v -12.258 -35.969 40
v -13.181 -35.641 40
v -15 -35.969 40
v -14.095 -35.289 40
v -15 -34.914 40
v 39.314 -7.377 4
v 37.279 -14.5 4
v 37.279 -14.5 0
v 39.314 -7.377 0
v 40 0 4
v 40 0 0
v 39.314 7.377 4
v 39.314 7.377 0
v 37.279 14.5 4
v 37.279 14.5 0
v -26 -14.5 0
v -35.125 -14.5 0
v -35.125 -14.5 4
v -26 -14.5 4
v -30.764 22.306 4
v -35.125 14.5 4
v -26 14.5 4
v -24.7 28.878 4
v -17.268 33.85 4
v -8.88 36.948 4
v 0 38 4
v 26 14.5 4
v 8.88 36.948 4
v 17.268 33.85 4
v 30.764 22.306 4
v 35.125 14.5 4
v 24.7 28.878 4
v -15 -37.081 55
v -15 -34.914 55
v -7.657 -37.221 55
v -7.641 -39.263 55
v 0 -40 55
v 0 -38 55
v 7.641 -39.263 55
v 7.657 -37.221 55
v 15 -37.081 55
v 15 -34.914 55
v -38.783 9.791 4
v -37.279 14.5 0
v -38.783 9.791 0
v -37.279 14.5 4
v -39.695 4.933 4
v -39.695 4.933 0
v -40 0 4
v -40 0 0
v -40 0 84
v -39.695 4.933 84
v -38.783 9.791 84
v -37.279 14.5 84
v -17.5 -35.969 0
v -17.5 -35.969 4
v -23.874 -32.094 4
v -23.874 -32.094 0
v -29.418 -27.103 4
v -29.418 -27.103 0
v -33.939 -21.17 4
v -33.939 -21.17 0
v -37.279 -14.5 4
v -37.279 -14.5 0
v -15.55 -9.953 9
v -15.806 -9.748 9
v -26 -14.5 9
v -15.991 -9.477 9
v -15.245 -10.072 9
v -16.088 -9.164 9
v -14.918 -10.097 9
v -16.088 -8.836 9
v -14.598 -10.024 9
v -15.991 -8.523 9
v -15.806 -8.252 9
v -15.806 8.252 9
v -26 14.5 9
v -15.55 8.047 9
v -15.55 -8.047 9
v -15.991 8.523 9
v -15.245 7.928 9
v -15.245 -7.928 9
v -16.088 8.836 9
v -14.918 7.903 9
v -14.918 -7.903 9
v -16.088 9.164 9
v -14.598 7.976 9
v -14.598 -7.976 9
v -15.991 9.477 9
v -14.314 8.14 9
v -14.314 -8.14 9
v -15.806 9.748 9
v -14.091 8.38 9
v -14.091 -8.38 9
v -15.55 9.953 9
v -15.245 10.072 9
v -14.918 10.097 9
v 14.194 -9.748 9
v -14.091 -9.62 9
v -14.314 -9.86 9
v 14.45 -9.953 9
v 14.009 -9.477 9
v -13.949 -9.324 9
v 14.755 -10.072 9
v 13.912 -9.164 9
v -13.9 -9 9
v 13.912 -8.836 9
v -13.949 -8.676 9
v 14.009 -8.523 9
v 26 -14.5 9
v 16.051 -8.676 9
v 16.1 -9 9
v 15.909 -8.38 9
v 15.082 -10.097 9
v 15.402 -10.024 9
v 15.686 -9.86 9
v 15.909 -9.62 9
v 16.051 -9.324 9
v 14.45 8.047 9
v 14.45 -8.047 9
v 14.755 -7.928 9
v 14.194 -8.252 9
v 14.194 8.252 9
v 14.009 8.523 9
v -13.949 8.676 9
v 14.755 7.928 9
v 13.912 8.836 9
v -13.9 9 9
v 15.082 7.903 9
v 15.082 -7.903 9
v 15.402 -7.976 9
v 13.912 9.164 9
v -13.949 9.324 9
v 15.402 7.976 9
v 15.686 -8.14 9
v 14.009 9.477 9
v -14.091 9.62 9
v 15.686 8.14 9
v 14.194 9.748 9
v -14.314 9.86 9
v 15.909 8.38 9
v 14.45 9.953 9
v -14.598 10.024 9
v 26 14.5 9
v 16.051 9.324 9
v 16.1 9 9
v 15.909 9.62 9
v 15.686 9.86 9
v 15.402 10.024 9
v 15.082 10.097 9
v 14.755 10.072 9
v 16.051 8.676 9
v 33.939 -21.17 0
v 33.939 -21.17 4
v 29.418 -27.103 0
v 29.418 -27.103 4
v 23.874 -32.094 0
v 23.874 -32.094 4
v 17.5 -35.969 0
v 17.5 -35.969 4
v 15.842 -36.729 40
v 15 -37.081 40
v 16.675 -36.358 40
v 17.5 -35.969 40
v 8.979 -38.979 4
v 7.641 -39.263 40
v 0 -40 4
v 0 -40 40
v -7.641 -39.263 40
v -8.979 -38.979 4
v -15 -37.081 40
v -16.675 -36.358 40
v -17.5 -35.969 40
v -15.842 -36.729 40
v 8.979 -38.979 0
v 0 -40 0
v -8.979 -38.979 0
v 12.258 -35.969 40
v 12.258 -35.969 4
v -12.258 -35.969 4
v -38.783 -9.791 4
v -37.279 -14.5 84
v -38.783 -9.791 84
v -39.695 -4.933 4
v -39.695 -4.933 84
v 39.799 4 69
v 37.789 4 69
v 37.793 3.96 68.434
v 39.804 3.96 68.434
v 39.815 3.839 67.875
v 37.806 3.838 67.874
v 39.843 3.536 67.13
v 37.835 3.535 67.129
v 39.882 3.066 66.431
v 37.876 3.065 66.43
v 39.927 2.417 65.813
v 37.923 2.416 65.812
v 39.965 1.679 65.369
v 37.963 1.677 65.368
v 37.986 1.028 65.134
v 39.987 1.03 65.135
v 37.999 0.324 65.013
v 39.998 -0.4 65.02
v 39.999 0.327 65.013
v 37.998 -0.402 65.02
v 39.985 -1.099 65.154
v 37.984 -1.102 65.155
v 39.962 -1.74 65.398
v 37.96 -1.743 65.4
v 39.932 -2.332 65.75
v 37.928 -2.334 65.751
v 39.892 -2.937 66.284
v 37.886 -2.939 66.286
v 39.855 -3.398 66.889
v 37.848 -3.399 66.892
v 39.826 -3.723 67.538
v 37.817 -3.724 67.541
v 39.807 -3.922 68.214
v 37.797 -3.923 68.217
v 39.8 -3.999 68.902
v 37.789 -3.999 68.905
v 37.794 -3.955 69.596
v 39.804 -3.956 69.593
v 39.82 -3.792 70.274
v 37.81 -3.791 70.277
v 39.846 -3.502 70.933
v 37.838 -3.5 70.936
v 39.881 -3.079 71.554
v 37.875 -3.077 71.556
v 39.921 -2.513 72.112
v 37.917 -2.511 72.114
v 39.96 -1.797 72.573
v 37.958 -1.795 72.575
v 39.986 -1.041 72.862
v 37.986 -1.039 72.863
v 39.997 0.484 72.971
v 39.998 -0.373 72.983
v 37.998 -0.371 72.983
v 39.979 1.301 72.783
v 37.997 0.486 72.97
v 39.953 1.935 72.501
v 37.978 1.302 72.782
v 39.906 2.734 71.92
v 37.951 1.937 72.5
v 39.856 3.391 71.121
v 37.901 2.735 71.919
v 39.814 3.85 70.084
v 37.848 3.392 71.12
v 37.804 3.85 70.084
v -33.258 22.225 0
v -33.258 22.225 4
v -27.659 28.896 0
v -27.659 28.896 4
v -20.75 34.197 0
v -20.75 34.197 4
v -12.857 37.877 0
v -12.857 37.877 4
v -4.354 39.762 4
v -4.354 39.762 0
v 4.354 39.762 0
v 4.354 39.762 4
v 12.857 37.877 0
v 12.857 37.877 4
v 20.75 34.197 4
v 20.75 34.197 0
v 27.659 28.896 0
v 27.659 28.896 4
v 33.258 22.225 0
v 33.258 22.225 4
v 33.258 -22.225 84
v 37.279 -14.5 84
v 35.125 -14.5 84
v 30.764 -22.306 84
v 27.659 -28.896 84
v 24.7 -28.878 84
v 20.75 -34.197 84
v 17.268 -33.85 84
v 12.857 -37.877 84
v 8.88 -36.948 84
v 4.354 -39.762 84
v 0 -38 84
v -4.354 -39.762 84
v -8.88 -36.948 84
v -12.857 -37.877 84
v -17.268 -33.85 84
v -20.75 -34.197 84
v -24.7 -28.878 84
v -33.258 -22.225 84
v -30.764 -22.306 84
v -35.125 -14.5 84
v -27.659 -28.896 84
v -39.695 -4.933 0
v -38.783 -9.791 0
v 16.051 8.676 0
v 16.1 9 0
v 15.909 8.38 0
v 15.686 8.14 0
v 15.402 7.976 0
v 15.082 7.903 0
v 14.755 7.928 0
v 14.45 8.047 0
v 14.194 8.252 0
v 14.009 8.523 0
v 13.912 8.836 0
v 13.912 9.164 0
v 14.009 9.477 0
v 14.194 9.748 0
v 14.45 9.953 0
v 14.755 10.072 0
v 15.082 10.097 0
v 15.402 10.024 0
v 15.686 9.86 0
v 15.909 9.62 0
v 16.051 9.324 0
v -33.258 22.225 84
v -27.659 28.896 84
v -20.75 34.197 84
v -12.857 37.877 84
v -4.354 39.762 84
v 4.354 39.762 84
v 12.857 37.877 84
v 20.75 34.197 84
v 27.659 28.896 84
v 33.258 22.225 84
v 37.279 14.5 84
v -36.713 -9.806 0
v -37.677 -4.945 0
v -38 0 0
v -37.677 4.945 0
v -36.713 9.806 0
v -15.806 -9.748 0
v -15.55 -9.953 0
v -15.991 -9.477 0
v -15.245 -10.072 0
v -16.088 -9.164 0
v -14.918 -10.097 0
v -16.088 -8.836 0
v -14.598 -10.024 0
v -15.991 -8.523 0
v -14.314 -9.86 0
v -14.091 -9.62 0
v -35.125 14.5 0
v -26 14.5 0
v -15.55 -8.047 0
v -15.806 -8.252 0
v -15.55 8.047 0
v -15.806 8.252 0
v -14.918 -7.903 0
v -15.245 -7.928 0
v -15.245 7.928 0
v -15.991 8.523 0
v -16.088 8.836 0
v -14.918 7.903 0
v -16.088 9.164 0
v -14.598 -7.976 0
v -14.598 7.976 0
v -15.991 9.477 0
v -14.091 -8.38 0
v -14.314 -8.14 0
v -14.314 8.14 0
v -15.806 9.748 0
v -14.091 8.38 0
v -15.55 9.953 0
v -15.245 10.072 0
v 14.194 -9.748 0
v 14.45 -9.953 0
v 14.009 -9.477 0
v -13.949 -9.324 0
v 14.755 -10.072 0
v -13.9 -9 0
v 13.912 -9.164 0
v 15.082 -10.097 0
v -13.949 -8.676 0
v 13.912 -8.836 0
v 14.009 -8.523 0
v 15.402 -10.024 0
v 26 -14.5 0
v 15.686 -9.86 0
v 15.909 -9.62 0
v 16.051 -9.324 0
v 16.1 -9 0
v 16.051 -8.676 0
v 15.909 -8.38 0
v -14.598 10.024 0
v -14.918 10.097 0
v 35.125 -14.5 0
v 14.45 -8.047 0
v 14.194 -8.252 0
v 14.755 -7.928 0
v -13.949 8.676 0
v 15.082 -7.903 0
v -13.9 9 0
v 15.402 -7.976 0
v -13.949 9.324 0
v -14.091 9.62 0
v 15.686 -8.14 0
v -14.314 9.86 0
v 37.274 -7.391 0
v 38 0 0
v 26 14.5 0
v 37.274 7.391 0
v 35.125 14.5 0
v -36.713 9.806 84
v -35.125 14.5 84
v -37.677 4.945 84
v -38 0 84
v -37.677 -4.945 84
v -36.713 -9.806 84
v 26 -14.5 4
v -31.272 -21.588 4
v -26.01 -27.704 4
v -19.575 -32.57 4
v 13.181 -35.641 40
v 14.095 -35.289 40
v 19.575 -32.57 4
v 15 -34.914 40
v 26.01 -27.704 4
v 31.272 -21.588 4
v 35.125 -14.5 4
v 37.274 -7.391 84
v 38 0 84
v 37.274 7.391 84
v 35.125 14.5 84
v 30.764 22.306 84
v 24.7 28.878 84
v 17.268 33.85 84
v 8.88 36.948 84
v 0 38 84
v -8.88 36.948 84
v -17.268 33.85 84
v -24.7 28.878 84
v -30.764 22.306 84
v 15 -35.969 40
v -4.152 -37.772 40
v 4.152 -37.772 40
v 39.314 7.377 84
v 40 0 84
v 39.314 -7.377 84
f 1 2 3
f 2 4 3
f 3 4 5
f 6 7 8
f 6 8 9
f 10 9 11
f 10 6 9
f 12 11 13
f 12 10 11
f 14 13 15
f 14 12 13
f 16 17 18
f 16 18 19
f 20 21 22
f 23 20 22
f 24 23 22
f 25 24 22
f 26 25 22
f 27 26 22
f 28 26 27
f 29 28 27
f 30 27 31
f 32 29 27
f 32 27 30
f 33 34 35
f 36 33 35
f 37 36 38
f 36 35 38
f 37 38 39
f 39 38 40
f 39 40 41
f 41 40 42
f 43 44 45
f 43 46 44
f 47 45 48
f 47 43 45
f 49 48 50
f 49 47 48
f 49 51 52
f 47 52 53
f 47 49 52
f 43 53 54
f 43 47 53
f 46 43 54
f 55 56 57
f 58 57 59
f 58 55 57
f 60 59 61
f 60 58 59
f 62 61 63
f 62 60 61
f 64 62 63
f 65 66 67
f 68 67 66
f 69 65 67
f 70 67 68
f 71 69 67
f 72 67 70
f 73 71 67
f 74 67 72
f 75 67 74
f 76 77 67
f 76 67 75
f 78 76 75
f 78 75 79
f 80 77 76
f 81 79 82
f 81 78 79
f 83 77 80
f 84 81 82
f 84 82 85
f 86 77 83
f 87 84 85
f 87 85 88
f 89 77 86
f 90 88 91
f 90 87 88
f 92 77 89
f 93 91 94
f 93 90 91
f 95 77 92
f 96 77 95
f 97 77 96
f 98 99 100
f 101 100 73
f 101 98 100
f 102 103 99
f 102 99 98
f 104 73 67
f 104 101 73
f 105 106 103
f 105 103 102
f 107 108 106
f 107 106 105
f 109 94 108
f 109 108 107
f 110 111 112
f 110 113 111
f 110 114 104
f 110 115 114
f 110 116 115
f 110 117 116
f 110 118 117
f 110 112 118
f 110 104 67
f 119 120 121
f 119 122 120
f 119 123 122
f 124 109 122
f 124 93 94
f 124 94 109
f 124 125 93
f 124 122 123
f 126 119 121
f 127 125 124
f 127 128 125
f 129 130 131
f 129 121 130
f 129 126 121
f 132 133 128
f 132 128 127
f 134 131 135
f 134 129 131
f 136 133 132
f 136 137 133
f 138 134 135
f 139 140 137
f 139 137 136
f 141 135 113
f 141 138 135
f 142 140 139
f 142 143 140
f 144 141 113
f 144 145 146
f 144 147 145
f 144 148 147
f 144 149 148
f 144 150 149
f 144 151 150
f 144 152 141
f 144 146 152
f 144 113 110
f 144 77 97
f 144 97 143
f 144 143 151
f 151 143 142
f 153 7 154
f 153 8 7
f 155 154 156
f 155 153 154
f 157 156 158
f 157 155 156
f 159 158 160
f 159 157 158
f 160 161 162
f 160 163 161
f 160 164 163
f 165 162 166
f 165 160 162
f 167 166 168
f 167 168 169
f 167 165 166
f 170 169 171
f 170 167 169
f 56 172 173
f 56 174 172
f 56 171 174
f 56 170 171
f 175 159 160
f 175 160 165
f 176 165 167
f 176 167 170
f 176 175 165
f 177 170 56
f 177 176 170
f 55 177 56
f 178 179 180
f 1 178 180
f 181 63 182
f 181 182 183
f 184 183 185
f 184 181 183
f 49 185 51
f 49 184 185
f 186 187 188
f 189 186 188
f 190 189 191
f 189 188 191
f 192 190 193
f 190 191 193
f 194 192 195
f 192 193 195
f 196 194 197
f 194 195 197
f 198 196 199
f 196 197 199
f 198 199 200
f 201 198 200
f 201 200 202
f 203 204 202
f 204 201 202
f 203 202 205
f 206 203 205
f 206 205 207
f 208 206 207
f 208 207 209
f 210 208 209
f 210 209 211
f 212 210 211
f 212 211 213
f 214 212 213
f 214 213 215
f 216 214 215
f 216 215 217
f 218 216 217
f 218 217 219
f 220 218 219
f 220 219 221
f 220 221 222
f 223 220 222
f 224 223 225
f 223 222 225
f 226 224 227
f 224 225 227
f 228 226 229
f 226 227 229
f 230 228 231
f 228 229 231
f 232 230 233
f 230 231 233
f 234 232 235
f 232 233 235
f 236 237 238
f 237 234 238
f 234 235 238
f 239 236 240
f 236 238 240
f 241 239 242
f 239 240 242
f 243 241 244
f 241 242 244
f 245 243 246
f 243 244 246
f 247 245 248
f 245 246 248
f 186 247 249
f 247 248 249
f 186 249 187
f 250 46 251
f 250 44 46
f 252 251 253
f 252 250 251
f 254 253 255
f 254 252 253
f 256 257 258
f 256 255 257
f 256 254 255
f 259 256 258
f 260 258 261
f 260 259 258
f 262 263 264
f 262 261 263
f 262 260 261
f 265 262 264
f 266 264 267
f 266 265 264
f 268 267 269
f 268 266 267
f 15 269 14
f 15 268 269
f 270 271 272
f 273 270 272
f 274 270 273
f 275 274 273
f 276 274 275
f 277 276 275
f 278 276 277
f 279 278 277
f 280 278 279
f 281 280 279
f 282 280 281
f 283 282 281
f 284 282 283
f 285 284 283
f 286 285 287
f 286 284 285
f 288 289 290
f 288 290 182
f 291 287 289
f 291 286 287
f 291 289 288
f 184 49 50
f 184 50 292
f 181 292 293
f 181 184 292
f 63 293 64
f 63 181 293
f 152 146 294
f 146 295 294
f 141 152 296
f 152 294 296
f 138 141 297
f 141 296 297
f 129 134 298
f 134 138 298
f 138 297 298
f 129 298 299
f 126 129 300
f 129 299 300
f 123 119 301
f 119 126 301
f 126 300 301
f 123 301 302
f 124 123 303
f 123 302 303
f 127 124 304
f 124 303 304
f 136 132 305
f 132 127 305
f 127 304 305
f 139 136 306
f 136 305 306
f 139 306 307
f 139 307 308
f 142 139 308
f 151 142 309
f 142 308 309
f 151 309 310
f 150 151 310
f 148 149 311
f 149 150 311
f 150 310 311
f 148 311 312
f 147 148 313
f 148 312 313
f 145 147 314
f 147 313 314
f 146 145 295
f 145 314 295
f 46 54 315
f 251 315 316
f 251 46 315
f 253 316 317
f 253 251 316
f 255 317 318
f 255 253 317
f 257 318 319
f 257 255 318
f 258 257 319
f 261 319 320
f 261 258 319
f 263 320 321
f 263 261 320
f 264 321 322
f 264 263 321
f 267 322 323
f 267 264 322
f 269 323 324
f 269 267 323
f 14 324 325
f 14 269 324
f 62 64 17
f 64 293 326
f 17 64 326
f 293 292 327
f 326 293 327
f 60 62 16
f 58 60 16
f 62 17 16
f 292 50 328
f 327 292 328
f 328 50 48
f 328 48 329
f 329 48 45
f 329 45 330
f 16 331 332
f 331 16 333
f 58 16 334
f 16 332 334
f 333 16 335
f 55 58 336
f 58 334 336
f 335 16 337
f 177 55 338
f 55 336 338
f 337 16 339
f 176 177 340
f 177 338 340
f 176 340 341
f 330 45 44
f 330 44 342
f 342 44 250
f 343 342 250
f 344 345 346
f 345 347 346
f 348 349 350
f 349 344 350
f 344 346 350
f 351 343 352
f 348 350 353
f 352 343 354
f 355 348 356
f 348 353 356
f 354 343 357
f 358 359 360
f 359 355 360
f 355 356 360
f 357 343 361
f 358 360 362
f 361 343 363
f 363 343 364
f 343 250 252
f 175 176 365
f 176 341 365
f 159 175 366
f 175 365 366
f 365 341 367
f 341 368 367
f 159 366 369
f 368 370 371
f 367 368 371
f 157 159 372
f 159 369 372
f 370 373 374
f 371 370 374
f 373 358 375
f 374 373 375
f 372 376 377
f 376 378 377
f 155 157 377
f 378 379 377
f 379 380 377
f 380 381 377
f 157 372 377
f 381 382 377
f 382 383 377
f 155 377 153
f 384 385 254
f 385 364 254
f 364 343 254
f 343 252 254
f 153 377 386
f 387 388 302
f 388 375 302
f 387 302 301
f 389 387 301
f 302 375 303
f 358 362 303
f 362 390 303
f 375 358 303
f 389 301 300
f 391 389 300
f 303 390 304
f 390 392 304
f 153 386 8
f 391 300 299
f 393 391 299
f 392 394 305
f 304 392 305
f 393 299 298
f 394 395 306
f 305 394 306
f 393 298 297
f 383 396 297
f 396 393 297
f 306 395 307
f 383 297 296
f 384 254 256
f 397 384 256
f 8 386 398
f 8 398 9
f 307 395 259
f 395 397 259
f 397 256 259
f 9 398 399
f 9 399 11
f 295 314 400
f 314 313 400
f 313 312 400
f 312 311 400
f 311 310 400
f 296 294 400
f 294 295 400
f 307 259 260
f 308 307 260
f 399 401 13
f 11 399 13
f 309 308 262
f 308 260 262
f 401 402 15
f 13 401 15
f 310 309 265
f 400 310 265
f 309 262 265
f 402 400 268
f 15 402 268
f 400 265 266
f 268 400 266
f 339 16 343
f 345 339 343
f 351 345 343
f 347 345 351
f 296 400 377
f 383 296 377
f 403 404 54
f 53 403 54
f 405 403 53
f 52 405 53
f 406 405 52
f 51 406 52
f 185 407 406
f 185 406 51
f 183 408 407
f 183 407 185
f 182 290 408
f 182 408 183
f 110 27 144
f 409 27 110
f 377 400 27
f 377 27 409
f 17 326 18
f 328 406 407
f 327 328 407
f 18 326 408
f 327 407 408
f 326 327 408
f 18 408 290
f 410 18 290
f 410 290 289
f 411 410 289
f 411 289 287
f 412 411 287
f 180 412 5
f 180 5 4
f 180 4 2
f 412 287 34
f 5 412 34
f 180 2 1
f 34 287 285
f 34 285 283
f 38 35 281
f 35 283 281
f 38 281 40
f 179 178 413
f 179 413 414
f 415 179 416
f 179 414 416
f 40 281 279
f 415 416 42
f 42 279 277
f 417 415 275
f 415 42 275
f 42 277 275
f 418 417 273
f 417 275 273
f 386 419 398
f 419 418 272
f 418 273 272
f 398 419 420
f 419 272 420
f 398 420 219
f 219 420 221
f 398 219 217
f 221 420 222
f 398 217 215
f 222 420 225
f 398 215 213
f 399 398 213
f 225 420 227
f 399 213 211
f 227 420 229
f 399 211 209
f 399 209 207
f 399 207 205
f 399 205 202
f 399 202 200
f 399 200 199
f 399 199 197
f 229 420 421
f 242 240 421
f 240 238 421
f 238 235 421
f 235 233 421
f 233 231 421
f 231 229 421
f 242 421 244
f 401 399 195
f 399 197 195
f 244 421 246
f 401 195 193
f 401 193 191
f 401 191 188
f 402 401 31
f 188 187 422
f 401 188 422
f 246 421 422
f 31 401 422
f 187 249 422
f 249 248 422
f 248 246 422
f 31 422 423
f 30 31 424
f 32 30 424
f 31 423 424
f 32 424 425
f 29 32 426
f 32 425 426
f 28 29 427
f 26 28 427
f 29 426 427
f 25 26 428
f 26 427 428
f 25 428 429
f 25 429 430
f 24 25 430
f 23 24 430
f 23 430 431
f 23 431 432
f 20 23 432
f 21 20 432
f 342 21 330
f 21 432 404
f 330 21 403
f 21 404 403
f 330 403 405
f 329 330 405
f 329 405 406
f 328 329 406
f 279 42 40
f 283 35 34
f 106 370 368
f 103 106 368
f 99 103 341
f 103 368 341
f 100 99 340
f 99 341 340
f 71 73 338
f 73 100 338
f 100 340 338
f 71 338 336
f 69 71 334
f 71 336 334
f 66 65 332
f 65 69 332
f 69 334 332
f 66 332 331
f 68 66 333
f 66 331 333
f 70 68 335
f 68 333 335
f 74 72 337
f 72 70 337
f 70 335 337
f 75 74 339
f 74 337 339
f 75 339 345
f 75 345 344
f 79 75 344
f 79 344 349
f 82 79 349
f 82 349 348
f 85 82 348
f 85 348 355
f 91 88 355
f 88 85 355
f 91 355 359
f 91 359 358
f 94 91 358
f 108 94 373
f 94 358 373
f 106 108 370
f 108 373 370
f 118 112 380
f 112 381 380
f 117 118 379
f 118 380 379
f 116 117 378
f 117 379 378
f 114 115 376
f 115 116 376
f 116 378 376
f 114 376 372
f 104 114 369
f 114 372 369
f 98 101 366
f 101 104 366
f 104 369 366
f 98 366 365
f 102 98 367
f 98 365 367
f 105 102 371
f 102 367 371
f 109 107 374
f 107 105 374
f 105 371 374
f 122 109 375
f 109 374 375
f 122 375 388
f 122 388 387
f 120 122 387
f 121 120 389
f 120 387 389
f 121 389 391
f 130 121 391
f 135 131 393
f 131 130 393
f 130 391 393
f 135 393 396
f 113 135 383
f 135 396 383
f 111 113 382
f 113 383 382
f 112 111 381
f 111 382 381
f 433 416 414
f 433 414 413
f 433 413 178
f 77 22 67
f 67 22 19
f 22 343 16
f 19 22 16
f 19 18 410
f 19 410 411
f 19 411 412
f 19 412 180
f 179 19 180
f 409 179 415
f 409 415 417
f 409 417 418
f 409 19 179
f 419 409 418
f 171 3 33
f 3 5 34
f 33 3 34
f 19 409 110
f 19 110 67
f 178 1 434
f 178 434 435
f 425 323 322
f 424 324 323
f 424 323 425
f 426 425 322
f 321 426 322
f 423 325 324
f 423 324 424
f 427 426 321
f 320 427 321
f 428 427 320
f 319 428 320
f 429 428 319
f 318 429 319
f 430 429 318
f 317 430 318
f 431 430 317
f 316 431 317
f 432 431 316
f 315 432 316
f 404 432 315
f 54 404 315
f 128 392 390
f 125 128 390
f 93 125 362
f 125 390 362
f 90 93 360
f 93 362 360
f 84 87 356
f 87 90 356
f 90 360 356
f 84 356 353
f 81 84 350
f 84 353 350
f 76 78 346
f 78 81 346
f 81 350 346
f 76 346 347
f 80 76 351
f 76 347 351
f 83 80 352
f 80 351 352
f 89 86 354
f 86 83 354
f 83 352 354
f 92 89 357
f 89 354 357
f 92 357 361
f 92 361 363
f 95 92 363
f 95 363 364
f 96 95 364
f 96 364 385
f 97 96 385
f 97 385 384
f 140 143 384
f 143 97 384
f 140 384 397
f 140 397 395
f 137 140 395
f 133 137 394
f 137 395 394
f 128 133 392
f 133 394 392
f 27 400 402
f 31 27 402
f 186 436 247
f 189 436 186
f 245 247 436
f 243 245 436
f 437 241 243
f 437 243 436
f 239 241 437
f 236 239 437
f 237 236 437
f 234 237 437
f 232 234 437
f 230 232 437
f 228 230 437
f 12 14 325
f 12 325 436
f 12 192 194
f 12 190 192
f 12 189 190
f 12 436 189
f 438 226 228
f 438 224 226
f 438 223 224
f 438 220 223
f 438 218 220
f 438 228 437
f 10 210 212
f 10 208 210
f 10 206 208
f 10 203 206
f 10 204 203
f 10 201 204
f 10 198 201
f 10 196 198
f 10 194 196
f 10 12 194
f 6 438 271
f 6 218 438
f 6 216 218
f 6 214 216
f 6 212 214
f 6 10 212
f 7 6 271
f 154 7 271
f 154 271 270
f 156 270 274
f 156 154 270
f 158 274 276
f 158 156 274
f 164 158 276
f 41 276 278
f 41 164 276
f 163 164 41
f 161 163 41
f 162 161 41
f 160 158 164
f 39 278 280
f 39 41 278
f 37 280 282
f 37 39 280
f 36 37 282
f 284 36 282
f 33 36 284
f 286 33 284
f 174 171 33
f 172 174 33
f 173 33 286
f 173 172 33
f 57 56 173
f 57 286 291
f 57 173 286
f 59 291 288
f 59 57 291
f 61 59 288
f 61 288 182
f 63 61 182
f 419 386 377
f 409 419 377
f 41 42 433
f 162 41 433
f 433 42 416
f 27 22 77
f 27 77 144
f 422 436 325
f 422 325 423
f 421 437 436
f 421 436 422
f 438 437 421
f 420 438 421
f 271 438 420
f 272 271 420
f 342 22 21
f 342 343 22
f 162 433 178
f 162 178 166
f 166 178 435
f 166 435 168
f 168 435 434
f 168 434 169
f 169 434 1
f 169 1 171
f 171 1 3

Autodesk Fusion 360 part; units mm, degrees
sketch "Sketch1" plane through (0, 0, 0) normal (0, 0, 1) x (1, 0, 0)
  circle A0 centre (0, 0) radius 40
  line L0 (0, 40) -> (0, -40) construction
  circle A1 centre (0, 0) radius 43
  line L1 (-26, 14.5) -> (-26, -14.5)
  line L2 (-40.4815, -14.5) -> (-26, -14.5)
  line L3 (-26, 14.5) -> (-40.4815, 14.5)
  line L4 (40, 0) -> (-40, 0) construction
  line L5 (26, 14.5) -> (40.4815, 14.5)
  line L6 (26, 14.5) -> (26, -14.5)
  line L7 (40.4815, -14.5) -> (26, -14.5)
  circle A2 centre (15, -9) radius 1.1
  circle A3 centre (15, 9) radius 1.1
  circle A4 centre (-15, -9) radius 1.1
  circle A5 centre (-15, 9) radius 1.1
  line L8 (-26, 14.5) -> (26, 14.5)
  line L9 (26, -14.5) -> (-26, -14.5)
  line L10 (17.5, -35.9687) -> (-17.5, -35.9687)
  dimension "d1" = 80
  dimension "d39" = 3
  dimension "d40" = 29
  dimension "d41" = 14
  dimension "d49" = 2.2
  dimension "d50" = 9
  dimension "d51" = 15
  dimension "d52" = 11
  dimension "d69" = 35
extrude "Extrude1" add sketch "Sketch1" along normal blind 4 contours A0 L10 | A0 L2 L7 L9 L10 | A0 L3 L5 L8 | L1 L6 L8 L9
sketch "Sketch3" plane through (0, 0, 4) normal (0, 0, 1) x (-1, 0, 0)
  circle A0 centre (0, 0) radius 38
  circle A1 centre (0, 0) radius 40
  line L0 (37.2794, -14.5) -> (26, -14.5)
  line L1 (26, -14.5) -> (26, 14.5)
  line L2 (26, 14.5) -> (37.2794, 14.5)
  line L3 (-26, 14.5) -> (-26, -14.5)
  line L4 (-26, -14.5) -> (-37.2794, -14.5)
  line L5 (-37.2794, 14.5) -> (-26, 14.5)
  circle A2 centre (-15, 9) radius 1.1
  circle A3 centre (15, -9) radius 1.1
  circle A4 centre (-15, -9) radius 1.1
  circle A5 centre (15, 9) radius 1.1
  arc A6 (-37.2794, -14.5) -> (37.2794, -14.5) centre (0, 0) ccw
  arc A7 (37.2794, 14.5) -> (-37.2794, 14.5) centre (0, 0) ccw
  dimension "d20" = 76
  dimension "d21" = 80
extrude "Extrude7" add sketch "Sketch3" along normal blind 80 and the other way blind 4 contours A0 A1 L0 L2 | A0 A1 L2 L5 A7 | A0 A1 L0 L4 A6 | A0 A1 L4 L5
extrude "Extrude12" add sketch "Sketch1" along normal blind 9 contours L1 L6 L8 L9
sketch "Sketch7" plane through (0, 0, 0) normal (0, 1, 0) x (1, 0, 0)
  line L0 (-15, -55) -> (15, -55)
  line L1 (15, -55) -> (15, -40)
  line L2 (15, -40) -> (-15, -40)
  line L3 (-15, -40) -> (-15, -55)
  line L4 (0, 0) -> (0, -80) construction
  line L5 (15, -40) -> (-15, -40)
  line L6 (-15, -40) -> (-15, -37)
  line L7 (-15, -37) -> (15, -37)
  line L8 (15, -37) -> (15, -40)
  dimension "d63" = 30
  dimension "d64" = 15
  dimension "d65" = 80
  dimension "d68" = 3
extrude "Extrude14" cut sketch "Sketch7" against normal blind 60 contours L0 L1 L2 L3 L5
extrude "Extrude15" add sketch "Sketch1" along normal blind 40 contours A0 L10
sketch "Sketch8" plane through (0, 0, 0) normal (1, 0, 0) x (0, 1, 0)
  circle A0 centre (0, 69) radius 4
  line L0 (40, 84) -> (-40, 84)
  dimension "d72" = 8
  dimension "d73" = 15
extrude "Extrude16" cut sketch "Sketch8" along normal blind 100
